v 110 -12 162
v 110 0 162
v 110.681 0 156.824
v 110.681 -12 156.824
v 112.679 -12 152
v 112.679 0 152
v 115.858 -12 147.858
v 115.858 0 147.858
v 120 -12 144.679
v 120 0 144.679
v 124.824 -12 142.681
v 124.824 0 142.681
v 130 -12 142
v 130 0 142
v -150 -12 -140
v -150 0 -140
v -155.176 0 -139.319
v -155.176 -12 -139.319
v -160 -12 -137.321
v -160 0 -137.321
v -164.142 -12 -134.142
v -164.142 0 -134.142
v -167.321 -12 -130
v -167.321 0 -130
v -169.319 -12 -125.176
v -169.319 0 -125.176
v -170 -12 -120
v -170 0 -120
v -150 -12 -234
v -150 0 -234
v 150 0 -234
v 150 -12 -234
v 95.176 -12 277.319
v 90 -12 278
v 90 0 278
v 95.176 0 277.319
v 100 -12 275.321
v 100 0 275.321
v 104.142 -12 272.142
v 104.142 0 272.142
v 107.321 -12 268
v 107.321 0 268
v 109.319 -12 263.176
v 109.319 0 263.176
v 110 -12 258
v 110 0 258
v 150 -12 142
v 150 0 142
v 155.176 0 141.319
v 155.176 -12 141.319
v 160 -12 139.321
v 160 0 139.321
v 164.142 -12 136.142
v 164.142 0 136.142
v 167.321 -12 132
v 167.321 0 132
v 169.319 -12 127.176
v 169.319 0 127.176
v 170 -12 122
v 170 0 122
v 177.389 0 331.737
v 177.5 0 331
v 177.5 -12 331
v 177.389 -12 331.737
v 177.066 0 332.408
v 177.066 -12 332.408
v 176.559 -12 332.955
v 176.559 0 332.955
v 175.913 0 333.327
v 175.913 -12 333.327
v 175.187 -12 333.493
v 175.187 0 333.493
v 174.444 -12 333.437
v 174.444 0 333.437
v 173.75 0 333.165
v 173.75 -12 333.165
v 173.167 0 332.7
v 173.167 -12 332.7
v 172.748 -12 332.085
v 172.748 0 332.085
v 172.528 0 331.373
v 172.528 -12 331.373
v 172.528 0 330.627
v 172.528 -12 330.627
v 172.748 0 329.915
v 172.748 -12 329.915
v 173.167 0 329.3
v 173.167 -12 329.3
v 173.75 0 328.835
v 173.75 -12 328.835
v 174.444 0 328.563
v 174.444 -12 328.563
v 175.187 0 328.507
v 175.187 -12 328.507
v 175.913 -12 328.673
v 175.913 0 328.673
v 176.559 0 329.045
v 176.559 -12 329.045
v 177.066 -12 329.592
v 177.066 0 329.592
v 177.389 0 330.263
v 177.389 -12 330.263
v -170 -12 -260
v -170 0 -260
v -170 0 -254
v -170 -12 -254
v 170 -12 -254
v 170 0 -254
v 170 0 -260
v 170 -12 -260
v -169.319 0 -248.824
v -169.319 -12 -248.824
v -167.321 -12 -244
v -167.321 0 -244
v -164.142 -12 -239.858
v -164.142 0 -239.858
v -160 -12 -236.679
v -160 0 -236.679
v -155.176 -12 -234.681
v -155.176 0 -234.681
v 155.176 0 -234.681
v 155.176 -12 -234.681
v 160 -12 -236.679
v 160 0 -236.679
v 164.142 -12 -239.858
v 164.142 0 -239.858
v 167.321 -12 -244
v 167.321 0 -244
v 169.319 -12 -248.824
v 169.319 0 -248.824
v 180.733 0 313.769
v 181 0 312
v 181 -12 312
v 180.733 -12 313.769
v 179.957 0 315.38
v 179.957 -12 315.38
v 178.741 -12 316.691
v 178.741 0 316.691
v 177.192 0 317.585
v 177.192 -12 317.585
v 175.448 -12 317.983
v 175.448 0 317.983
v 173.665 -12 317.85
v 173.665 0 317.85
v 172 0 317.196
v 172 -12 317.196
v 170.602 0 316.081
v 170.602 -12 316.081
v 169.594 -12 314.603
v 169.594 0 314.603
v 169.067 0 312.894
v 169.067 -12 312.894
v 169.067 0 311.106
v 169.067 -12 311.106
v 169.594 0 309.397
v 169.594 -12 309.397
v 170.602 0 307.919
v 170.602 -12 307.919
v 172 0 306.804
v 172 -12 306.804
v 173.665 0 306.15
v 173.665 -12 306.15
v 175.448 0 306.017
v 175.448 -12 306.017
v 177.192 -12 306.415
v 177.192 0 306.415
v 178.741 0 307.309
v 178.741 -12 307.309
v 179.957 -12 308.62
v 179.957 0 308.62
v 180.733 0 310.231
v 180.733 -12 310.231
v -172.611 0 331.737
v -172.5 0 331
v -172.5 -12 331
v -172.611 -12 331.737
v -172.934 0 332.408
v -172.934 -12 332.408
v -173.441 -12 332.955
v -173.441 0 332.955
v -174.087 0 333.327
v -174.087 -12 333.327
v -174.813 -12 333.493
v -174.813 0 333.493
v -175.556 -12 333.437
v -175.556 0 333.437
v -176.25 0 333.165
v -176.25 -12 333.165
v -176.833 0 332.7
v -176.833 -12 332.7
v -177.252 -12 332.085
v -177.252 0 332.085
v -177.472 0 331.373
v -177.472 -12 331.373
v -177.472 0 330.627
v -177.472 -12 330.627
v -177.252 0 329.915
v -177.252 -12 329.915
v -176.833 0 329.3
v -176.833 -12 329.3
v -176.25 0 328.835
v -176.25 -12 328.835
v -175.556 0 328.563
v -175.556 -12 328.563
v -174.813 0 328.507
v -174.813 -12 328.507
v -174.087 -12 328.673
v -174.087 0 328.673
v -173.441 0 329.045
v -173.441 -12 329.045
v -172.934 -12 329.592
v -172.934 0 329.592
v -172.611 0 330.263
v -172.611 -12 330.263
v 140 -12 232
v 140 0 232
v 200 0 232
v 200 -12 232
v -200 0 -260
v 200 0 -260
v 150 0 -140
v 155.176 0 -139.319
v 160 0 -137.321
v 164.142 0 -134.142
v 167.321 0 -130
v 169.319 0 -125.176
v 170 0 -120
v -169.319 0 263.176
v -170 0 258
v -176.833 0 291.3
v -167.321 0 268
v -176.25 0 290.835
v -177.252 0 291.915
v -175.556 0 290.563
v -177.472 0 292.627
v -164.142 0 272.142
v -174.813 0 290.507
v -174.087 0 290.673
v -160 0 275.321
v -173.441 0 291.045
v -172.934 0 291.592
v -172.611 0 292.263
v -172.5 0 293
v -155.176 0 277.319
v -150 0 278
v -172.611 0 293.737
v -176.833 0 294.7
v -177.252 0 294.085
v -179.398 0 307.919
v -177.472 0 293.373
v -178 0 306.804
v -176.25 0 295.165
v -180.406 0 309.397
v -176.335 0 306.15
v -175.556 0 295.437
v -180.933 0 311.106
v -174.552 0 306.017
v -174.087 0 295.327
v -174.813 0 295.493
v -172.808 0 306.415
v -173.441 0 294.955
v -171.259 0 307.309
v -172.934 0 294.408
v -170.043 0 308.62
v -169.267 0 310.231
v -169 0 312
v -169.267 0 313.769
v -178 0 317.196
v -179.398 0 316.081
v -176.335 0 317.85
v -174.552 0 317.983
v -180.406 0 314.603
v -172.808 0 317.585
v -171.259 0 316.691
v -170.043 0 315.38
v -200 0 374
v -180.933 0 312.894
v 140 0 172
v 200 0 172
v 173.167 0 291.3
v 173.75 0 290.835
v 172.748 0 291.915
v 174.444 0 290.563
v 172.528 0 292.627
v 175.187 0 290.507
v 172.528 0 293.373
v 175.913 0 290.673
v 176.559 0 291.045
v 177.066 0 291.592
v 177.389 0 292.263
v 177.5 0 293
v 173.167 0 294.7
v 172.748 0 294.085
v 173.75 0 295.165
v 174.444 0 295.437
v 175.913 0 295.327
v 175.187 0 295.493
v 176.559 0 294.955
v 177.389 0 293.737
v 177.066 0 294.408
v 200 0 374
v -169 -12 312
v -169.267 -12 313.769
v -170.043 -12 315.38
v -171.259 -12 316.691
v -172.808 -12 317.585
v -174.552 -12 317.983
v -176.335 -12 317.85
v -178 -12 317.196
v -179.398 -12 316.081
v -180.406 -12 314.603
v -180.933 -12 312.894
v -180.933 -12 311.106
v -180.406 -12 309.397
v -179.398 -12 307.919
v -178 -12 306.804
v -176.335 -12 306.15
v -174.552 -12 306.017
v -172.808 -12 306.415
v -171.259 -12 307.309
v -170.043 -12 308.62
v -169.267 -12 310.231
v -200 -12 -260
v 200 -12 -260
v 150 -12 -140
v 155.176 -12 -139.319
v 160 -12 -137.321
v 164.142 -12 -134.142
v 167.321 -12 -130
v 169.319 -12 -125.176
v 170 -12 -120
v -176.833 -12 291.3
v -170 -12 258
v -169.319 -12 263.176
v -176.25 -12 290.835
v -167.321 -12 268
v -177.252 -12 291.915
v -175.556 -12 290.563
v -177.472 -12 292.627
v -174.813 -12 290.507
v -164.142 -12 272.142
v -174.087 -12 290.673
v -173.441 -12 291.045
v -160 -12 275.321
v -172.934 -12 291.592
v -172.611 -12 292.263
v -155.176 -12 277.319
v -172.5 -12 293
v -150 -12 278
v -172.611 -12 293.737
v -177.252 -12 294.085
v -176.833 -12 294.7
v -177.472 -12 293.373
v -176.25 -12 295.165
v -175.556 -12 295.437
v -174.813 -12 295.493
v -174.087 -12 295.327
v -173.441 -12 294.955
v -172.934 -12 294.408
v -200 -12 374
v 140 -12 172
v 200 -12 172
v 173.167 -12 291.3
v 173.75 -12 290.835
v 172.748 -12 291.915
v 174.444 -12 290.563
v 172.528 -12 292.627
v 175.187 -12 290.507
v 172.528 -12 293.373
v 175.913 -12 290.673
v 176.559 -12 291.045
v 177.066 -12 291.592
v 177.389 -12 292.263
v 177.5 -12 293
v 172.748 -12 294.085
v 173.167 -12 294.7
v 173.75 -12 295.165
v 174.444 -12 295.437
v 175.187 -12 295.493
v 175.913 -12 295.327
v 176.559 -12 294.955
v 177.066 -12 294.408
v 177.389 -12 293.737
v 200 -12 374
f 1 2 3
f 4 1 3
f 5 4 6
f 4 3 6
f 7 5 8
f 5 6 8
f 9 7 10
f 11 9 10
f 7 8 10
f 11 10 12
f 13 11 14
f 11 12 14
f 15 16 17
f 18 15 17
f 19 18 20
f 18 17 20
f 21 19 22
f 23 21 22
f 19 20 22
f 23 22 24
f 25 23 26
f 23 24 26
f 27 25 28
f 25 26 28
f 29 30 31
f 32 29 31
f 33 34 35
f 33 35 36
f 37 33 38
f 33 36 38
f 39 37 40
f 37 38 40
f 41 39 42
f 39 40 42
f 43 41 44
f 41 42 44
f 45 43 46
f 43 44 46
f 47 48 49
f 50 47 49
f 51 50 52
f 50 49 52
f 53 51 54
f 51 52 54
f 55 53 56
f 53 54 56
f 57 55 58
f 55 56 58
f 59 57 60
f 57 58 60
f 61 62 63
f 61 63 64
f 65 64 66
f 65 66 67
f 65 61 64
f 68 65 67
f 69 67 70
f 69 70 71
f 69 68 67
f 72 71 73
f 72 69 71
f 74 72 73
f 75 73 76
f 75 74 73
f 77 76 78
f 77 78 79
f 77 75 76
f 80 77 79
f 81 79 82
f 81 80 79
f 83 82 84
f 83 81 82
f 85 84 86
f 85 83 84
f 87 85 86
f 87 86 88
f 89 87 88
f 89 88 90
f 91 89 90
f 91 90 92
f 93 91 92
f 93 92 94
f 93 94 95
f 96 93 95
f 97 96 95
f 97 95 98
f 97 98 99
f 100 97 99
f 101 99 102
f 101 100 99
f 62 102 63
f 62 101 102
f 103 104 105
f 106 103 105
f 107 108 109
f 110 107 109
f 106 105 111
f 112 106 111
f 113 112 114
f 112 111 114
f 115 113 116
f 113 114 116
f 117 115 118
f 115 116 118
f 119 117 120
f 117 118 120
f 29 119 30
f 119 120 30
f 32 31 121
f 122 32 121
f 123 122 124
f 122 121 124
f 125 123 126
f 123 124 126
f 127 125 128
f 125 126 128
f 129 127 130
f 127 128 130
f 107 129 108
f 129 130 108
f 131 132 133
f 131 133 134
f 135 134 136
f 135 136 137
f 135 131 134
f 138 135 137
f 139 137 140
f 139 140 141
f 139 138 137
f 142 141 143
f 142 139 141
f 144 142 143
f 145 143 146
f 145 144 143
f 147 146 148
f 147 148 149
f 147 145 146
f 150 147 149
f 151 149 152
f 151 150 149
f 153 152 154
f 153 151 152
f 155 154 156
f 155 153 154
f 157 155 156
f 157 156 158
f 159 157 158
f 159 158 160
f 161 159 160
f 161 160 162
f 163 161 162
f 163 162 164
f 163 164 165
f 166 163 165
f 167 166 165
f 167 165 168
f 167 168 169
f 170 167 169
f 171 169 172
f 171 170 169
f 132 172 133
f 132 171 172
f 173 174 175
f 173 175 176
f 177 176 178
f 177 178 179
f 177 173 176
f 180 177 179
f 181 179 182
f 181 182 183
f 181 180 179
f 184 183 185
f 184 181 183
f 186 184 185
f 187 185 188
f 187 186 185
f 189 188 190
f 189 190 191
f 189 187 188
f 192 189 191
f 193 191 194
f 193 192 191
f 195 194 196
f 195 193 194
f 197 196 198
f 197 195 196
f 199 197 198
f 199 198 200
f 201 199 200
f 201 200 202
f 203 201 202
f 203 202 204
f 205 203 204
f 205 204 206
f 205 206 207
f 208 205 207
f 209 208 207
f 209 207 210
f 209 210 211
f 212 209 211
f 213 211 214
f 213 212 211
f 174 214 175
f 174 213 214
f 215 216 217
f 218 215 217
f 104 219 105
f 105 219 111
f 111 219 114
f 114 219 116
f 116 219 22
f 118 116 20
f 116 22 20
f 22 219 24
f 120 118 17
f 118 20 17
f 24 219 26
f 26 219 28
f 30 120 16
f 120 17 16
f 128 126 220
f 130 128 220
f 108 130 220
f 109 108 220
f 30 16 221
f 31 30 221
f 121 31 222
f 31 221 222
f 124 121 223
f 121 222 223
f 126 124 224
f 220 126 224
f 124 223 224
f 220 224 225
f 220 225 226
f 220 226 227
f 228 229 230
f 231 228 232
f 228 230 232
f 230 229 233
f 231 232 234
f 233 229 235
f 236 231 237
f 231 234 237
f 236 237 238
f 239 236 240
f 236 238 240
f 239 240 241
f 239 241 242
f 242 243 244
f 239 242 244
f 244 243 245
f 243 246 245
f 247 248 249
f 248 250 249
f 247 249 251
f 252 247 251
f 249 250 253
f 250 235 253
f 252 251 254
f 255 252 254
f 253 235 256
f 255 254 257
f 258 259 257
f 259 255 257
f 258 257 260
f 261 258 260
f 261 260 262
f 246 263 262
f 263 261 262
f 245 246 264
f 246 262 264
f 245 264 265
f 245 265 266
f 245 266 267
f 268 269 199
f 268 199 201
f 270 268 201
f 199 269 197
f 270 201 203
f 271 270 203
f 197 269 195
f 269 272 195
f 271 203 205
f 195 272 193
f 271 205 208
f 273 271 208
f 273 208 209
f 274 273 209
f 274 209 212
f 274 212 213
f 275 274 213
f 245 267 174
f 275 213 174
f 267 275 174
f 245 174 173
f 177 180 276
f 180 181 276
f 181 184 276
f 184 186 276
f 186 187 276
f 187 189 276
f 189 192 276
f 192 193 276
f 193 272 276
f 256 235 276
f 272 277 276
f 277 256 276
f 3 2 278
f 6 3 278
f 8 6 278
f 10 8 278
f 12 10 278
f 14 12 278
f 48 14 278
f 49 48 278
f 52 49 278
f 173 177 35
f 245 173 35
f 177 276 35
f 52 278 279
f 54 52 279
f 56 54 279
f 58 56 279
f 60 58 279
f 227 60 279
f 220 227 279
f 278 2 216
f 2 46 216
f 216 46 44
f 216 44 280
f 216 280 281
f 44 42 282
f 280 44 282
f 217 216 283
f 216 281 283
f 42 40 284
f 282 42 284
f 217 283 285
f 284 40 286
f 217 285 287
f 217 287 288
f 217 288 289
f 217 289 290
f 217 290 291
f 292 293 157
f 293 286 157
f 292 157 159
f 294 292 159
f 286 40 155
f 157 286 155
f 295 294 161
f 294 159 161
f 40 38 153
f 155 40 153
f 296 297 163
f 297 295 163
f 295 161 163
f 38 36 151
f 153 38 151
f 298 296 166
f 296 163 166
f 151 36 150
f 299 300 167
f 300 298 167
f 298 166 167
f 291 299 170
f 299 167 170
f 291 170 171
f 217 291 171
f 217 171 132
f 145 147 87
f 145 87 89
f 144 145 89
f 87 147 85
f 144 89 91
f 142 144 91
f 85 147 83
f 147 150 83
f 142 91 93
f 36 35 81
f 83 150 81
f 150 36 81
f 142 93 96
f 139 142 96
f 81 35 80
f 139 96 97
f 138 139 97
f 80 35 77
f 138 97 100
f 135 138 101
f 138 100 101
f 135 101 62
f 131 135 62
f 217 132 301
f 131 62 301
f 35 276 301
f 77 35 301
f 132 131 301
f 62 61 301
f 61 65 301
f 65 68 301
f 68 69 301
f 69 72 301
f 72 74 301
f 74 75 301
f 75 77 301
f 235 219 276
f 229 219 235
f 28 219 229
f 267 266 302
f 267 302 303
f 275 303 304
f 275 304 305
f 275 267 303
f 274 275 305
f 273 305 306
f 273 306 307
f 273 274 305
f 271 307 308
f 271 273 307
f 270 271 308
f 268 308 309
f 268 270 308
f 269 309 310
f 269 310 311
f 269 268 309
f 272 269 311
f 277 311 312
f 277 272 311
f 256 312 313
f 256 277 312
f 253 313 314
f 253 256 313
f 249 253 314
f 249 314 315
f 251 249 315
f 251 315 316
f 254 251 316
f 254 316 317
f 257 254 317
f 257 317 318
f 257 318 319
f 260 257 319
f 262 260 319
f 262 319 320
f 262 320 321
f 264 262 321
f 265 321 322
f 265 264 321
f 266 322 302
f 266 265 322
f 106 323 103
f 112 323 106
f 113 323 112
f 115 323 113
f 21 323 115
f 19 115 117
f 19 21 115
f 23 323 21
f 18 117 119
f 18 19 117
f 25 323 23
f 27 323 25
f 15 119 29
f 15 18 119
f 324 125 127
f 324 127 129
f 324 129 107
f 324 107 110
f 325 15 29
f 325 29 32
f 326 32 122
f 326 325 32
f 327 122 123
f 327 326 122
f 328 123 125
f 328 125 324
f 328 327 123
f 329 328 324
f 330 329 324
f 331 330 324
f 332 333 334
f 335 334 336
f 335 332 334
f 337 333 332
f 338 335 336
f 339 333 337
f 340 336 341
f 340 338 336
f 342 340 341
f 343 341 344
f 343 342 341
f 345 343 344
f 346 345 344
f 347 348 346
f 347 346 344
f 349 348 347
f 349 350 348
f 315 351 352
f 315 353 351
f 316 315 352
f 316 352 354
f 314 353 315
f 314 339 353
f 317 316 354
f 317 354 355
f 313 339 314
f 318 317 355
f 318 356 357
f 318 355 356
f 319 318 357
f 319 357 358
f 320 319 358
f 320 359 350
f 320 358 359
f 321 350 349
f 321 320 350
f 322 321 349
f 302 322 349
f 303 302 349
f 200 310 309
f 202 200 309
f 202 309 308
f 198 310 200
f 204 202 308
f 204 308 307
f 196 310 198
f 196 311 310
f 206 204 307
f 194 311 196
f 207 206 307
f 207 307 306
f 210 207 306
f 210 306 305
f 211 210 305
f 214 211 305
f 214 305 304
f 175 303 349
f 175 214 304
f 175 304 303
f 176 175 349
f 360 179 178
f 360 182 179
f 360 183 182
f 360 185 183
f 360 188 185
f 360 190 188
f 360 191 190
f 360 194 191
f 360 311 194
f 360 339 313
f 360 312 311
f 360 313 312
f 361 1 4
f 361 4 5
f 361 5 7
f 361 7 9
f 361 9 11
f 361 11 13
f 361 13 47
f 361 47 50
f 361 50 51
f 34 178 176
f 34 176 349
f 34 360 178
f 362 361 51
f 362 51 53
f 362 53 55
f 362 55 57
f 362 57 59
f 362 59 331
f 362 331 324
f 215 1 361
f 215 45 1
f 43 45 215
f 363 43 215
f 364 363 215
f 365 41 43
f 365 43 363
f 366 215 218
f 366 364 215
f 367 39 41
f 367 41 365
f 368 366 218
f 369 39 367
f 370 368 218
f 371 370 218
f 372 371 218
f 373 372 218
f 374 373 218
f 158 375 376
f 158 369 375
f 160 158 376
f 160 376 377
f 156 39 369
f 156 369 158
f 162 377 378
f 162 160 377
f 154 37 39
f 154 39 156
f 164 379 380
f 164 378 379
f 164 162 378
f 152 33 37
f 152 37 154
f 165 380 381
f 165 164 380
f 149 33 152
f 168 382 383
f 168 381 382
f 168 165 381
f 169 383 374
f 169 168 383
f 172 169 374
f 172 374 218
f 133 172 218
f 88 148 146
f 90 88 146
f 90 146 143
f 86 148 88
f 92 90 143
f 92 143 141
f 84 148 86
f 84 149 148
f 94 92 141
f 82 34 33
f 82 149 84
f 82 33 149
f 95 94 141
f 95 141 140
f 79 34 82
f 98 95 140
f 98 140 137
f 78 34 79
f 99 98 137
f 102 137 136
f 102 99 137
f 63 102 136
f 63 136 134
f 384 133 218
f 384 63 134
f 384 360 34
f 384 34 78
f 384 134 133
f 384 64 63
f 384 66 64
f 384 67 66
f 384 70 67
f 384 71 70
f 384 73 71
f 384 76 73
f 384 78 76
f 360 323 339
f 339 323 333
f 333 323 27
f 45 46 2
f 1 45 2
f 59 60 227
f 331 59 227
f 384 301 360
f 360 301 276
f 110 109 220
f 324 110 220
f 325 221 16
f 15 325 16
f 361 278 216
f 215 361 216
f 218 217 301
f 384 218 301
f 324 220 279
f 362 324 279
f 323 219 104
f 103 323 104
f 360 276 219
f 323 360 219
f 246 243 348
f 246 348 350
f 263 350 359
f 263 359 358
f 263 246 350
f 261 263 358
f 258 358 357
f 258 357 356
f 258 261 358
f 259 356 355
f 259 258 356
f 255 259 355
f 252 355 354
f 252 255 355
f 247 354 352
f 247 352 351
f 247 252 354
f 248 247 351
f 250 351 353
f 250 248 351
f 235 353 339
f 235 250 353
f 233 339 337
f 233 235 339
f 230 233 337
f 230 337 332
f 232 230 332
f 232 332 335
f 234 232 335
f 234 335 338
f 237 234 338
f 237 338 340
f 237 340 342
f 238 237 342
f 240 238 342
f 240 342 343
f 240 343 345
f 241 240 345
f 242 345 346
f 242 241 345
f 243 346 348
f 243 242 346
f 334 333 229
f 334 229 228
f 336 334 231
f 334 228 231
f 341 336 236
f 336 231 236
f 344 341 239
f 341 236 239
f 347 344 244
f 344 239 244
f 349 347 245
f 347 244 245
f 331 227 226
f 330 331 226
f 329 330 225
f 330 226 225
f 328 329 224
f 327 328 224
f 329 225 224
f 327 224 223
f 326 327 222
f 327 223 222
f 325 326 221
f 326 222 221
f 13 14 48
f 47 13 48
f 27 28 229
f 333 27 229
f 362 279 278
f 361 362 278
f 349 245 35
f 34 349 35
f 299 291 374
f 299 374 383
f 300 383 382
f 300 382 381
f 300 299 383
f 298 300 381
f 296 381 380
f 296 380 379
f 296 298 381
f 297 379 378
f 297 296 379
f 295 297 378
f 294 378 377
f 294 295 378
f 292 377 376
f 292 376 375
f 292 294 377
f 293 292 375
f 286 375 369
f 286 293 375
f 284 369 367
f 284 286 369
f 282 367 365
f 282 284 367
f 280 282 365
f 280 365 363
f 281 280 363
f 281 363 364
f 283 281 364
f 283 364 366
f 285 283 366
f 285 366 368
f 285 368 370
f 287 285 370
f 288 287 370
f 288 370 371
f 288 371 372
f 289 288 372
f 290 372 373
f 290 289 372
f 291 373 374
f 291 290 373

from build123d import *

# Parameters (mm, degrees)
F1_R     = 2.5
F1_R_2   = 6
F1_W     = 400
F1_H     = 12
F1_H_2   = 60
F2_DEPTH = 12


with BuildPart() as f2:
    # F1 (on Front) → F2 (new body)
    with BuildSketch(Plane.XZ):
        Polygon((200, 232), (200, 374), (-200, 374), (-200, -150), (200, -150), (200, 172), (140, 172), (140, 232), align=None)
        with Locations((-175, 293)):
            Circle(F1_R, mode=Mode.SUBTRACT)
        with Locations((-175, 312)):
            Circle(F1_R_2, mode=Mode.SUBTRACT)
        with Locations((-175, 331)):
            Circle(F1_R, mode=Mode.SUBTRACT)
        with BuildLine():
            Line((-150, 278), (90, 278))
            ThreePointArc((90, 278), (104.1421356237, 272.1421356237), (110, 258))
            Line((110, 258), (110, 162))
            ThreePointArc((110, 162), (115.8578643763, 147.8578643763), (130, 142))
            Line((130, 142), (150, 142))
            ThreePointArc((150, 142), (164.1421356237, 136.1421356237), (170, 122))
            Line((170, 122), (170, -120))
            ThreePointArc((170, -120), (164.1421356237, -134.1421356237), (150, -140))
            Line((150, -140), (-150, -140))
            ThreePointArc((-150, -140), (-164.1421356237, -134.1421356237), (-170, -120))
            Line((-170, -120), (-170, 258))
            ThreePointArc((-170, 258), (-164.1421356237, 272.1421356237), (-150, 278))
        make_face(mode=Mode.SUBTRACT)
        with Locations((175, 293)):
            Circle(F1_R, mode=Mode.SUBTRACT)
        with Locations((175, 312)):
            Circle(F1_R_2, mode=Mode.SUBTRACT)
        with Locations((175, 331)):
            Circle(F1_R, mode=Mode.SUBTRACT)
        with Locations((0, -156)):
            Rectangle(F1_W, F1_H)
        with Locations((0, -192)):
            Rectangle(F1_W, F1_H_2)
        Polygon((200, -222), (-200, -222), (-200, -234), (-150, -234), (150, -234), (200, -234), align=None)
        with BuildLine():
            Line((200, -260), (200, -234))
            Line((200, -234), (150, -234))
            ThreePointArc((150, -234), (164.1421356237, -239.8578643763), (170, -254))
            Line((170, -254), (170, -260))
            Line((170, -260), (200, -260))
        make_face()
        with BuildLine():
            Line((-150, -234), (-200, -234))
            Line((-200, -234), (-200, -260))
            Line((-200, -260), (-170, -260))
            Line((-170, -260), (-170, -254))
            ThreePointArc((-170, -254), (-164.1421356237, -239.8578643763), (-150, -234))
        make_face()
    extrude(amount=F2_DEPTH)


solid = f2.part
